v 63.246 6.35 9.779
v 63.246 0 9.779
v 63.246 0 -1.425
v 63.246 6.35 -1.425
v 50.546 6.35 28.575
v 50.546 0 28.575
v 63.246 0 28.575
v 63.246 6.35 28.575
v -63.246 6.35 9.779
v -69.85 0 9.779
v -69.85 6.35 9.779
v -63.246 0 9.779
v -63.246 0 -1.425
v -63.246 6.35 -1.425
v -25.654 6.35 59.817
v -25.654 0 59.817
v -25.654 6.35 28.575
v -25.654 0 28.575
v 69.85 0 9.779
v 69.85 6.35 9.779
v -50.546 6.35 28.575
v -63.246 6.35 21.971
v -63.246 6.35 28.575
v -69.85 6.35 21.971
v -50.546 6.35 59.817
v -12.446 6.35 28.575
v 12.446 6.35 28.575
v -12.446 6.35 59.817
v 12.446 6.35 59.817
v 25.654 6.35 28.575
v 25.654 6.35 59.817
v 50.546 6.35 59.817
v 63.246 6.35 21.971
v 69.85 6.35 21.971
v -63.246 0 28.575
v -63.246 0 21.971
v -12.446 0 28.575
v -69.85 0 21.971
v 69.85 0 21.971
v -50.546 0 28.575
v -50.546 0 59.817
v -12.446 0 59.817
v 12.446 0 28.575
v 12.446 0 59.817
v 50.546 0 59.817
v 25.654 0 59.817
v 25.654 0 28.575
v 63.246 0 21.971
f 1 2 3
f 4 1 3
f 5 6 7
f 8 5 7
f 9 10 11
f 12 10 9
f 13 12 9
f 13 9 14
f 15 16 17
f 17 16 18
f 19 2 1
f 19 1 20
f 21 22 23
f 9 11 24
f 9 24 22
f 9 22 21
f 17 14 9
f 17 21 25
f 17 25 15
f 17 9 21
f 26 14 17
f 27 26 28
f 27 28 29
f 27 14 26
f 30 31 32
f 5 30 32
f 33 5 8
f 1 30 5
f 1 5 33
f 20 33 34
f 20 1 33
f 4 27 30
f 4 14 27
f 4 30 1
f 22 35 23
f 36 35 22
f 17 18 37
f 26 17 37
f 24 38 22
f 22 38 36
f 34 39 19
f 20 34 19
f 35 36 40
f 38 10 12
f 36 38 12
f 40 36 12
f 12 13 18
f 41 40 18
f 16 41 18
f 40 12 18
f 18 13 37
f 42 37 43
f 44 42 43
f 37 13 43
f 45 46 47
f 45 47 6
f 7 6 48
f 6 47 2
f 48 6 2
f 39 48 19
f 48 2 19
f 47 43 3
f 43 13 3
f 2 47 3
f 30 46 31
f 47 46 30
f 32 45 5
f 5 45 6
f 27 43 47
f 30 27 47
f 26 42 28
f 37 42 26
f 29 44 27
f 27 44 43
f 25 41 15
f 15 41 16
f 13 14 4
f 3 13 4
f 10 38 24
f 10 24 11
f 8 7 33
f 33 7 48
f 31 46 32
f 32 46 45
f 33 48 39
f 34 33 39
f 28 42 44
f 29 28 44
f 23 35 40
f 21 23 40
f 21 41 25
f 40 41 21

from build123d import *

# Parameters (mm, degrees)
SKETCH1_W           = 139.7
SKETCH1_H           = 57.15
BOSS_EXTRUDE1_DEPTH = 6.35
SKETCH3_W           = 24.892
SKETCH3_H           = 31.242
BOSS_EXTRUDE2_DEPTH = 6.35
SKETCH4_W           = 13.208
SKETCH4_H           = 13.208
CUT_EXTRUDE2_DEPTH  = 93.181443301
SKETCH5_W           = 295.464136086
SKETCH5_H           = 12.7
CUT_EXTRUDE3_DEPTH  = 93.181443301
SKETCH6_W           = 139.7
SKETCH6_H           = 12.446
BOSS_EXTRUDE3_DEPTH = 6.35
SKETCH7_W           = 139.7
SKETCH7_H           = 14.45
CUT_EXTRUDE4_DEPTH  = 93.181443301


with BuildPart() as part:
    # Sketch1 → Boss-Extrude1 (new body)
    with BuildSketch(Plane(origin=(0, 0, 0), x_dir=(1, 0, 0), z_dir=(0, 1, 0))):
        Rectangle(SKETCH1_W, SKETCH1_H)
    extrude(amount=BOSS_EXTRUDE1_DEPTH)

    # Sketch3 → Boss-Extrude2 (add)
    with BuildSketch(Plane(origin=(0, 0, 0), x_dir=(1, 0, 0), z_dir=(0, 1, 0))):
        with Locations((-38.1, -44.196)):
            Rectangle(SKETCH3_W, SKETCH3_H)
        with Locations((0, -44.196)):
            Rectangle(SKETCH3_W, SKETCH3_H)
        with Locations((38.1, -44.196)):
            Rectangle(SKETCH3_W, SKETCH3_H)
    extrude(amount=BOSS_EXTRUDE2_DEPTH)

    # Sketch4 → Cut-Extrude2 (cut, through all)
    with BuildSketch(Plane(origin=(0, 0, 0), x_dir=(1, 0, 0), z_dir=(0, 1, 0))):
        with Locations((69.85, 22.225)):
            Rectangle(SKETCH4_W, SKETCH4_H)
        with Locations((-69.85, -28.575)):
            Rectangle(SKETCH4_W, SKETCH4_H)
        with Locations((69.85, -3.175)):
            Rectangle(SKETCH4_W, SKETCH4_H)
        with Locations((69.85, -28.575)):
            Rectangle(SKETCH4_W, SKETCH4_H)
        with Locations((-69.85, -3.175)):
            Rectangle(SKETCH4_W, SKETCH4_H)
        with Locations((-69.85, 22.225)):
            Rectangle(SKETCH4_W, SKETCH4_H)
    extrude(amount=CUT_EXTRUDE2_DEPTH, mode=Mode.SUBTRACT)

    # Sketch5 → Cut-Extrude3 (cut, through all)
    with BuildSketch(Plane(origin=(0, 6.35, 0), x_dir=(1, 0, 0), z_dir=(0, 1, 0))):
        with Locations((7.963252738, 22.225)):
            Rectangle(SKETCH5_W, SKETCH5_H)
    extrude(amount=-CUT_EXTRUDE3_DEPTH, mode=Mode.SUBTRACT)

    # Sketch6 → Boss-Extrude3 (add)
    with BuildSketch(Plane(origin=(0, 6.35, 0), x_dir=(1, 0, 0), z_dir=(0, 1, 0))):
        with Locations((0, 9.652)):
            Rectangle(SKETCH6_W, SKETCH6_H)
    extrude(amount=-BOSS_EXTRUDE3_DEPTH)

    # Sketch7 → Cut-Extrude4 (cut, through all)
    with BuildSketch(Plane(origin=(0, 6.35, 0), x_dir=(1, 0, 0), z_dir=(0, 1, 0))):
        with Locations((0, 8.65)):
            Rectangle(SKETCH7_W, SKETCH7_H)
    extrude(amount=-CUT_EXTRUDE4_DEPTH, mode=Mode.SUBTRACT)


solid = part.part
